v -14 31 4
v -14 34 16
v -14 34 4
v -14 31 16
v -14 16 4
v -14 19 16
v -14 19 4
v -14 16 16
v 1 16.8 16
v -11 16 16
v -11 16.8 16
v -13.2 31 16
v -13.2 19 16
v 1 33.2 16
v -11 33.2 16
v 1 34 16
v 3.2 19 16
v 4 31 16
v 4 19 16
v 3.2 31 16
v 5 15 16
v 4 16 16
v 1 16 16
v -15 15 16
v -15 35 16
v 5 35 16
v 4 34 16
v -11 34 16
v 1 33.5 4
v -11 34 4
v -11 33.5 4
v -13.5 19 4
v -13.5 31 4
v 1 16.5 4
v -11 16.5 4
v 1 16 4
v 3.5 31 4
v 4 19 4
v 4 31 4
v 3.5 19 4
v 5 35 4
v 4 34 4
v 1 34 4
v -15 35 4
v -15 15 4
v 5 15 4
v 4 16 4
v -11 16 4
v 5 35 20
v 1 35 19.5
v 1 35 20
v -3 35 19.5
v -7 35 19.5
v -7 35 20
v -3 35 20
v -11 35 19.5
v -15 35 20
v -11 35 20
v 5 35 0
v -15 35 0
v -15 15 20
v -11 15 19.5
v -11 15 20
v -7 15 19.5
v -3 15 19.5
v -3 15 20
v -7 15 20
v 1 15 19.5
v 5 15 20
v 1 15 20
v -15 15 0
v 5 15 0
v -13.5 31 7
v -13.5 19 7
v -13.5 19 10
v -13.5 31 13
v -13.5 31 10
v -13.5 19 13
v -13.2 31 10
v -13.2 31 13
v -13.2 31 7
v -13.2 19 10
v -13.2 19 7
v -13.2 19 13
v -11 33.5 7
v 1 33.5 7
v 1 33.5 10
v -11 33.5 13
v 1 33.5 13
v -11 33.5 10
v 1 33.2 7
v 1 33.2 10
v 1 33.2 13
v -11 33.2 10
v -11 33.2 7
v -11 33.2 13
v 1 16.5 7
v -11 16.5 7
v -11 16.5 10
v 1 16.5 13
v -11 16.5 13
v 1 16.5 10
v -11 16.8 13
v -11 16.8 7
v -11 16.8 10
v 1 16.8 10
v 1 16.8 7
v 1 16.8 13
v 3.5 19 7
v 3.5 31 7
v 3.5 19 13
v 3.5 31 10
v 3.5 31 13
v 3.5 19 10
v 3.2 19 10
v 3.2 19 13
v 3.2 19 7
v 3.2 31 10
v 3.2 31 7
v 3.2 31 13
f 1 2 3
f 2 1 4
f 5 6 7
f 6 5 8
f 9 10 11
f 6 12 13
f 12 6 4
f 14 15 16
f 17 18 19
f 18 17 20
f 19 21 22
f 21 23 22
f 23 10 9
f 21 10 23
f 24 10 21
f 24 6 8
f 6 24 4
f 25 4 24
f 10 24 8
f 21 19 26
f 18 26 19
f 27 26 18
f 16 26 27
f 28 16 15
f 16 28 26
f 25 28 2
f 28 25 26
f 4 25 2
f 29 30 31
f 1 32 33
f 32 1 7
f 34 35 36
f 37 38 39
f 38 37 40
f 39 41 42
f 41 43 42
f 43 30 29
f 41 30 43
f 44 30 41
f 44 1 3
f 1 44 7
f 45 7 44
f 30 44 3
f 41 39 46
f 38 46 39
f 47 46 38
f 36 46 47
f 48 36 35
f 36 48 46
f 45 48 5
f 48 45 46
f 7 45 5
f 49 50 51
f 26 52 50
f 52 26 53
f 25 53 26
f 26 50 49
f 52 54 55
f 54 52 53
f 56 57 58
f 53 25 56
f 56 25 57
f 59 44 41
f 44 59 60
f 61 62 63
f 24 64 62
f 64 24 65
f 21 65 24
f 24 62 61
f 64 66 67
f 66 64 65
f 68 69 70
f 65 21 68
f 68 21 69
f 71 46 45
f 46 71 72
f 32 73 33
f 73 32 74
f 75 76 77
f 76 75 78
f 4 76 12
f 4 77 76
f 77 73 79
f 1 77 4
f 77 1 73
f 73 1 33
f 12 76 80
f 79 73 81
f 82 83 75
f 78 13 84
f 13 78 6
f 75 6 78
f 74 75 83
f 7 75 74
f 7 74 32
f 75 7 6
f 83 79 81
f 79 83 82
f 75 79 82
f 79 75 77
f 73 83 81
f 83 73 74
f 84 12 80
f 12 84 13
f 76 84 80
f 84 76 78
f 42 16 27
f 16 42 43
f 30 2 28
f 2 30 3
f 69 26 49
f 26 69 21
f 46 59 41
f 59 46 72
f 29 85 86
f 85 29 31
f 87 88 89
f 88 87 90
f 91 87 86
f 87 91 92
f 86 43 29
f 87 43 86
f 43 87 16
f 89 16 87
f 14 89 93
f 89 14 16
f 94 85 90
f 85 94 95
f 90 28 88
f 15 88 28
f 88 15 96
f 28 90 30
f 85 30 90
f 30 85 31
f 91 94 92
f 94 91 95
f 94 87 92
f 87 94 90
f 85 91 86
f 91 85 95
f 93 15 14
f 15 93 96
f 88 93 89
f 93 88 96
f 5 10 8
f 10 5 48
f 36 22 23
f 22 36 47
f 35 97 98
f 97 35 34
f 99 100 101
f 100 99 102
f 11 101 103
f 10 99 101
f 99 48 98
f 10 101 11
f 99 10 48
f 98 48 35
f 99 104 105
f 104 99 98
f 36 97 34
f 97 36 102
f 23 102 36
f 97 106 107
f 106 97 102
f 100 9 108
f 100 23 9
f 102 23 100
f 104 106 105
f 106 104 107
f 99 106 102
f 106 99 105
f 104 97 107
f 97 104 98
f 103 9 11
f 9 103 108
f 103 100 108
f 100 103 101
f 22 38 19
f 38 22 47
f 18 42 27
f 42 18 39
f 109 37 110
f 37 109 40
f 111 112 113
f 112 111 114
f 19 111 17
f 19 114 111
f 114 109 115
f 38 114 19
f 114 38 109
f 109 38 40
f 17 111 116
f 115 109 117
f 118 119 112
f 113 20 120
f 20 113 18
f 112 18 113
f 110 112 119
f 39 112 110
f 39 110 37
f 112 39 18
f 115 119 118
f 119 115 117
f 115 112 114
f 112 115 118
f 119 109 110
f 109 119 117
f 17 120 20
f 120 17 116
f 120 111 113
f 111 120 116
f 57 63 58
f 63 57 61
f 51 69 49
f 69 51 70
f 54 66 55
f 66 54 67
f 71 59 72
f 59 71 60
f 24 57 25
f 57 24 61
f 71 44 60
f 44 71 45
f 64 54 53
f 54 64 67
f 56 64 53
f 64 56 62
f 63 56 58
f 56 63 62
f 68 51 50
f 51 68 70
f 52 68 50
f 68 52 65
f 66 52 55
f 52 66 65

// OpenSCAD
module wallInset()
{
	translate([-1, 0, 4]) cube([2  ,20,12]);
	translate([-1, 4, 4]) cube([2.5,12,12]);
	translate([0, 4, 7]) cube([1.8,12,3]);
	translate([0, 4, 13]) cube([1.8,12,3]);
}

module box()
{
	difference()
	{
		cube([20,20,20]);
		wallInset();
		translate([ 0,20, 0]) rotate([0,0,-90]) wallInset();
		translate([20, 0, 0]) rotate([0,0, 90]) wallInset();
		translate([20,20, 0]) rotate([0,0,180]) wallInset();
		translate([ 4, 0,19.5]) cube([4,20,1]);
		translate([12, 0,19.5]) cube([4,20,1]);
	}
}

translate([-15, 15, 0]) box();
//translate([-15,-15, 0]) box();
//translate([ 15,-15, 0]) box();
//translate([ 15, 15, 0]) box();
